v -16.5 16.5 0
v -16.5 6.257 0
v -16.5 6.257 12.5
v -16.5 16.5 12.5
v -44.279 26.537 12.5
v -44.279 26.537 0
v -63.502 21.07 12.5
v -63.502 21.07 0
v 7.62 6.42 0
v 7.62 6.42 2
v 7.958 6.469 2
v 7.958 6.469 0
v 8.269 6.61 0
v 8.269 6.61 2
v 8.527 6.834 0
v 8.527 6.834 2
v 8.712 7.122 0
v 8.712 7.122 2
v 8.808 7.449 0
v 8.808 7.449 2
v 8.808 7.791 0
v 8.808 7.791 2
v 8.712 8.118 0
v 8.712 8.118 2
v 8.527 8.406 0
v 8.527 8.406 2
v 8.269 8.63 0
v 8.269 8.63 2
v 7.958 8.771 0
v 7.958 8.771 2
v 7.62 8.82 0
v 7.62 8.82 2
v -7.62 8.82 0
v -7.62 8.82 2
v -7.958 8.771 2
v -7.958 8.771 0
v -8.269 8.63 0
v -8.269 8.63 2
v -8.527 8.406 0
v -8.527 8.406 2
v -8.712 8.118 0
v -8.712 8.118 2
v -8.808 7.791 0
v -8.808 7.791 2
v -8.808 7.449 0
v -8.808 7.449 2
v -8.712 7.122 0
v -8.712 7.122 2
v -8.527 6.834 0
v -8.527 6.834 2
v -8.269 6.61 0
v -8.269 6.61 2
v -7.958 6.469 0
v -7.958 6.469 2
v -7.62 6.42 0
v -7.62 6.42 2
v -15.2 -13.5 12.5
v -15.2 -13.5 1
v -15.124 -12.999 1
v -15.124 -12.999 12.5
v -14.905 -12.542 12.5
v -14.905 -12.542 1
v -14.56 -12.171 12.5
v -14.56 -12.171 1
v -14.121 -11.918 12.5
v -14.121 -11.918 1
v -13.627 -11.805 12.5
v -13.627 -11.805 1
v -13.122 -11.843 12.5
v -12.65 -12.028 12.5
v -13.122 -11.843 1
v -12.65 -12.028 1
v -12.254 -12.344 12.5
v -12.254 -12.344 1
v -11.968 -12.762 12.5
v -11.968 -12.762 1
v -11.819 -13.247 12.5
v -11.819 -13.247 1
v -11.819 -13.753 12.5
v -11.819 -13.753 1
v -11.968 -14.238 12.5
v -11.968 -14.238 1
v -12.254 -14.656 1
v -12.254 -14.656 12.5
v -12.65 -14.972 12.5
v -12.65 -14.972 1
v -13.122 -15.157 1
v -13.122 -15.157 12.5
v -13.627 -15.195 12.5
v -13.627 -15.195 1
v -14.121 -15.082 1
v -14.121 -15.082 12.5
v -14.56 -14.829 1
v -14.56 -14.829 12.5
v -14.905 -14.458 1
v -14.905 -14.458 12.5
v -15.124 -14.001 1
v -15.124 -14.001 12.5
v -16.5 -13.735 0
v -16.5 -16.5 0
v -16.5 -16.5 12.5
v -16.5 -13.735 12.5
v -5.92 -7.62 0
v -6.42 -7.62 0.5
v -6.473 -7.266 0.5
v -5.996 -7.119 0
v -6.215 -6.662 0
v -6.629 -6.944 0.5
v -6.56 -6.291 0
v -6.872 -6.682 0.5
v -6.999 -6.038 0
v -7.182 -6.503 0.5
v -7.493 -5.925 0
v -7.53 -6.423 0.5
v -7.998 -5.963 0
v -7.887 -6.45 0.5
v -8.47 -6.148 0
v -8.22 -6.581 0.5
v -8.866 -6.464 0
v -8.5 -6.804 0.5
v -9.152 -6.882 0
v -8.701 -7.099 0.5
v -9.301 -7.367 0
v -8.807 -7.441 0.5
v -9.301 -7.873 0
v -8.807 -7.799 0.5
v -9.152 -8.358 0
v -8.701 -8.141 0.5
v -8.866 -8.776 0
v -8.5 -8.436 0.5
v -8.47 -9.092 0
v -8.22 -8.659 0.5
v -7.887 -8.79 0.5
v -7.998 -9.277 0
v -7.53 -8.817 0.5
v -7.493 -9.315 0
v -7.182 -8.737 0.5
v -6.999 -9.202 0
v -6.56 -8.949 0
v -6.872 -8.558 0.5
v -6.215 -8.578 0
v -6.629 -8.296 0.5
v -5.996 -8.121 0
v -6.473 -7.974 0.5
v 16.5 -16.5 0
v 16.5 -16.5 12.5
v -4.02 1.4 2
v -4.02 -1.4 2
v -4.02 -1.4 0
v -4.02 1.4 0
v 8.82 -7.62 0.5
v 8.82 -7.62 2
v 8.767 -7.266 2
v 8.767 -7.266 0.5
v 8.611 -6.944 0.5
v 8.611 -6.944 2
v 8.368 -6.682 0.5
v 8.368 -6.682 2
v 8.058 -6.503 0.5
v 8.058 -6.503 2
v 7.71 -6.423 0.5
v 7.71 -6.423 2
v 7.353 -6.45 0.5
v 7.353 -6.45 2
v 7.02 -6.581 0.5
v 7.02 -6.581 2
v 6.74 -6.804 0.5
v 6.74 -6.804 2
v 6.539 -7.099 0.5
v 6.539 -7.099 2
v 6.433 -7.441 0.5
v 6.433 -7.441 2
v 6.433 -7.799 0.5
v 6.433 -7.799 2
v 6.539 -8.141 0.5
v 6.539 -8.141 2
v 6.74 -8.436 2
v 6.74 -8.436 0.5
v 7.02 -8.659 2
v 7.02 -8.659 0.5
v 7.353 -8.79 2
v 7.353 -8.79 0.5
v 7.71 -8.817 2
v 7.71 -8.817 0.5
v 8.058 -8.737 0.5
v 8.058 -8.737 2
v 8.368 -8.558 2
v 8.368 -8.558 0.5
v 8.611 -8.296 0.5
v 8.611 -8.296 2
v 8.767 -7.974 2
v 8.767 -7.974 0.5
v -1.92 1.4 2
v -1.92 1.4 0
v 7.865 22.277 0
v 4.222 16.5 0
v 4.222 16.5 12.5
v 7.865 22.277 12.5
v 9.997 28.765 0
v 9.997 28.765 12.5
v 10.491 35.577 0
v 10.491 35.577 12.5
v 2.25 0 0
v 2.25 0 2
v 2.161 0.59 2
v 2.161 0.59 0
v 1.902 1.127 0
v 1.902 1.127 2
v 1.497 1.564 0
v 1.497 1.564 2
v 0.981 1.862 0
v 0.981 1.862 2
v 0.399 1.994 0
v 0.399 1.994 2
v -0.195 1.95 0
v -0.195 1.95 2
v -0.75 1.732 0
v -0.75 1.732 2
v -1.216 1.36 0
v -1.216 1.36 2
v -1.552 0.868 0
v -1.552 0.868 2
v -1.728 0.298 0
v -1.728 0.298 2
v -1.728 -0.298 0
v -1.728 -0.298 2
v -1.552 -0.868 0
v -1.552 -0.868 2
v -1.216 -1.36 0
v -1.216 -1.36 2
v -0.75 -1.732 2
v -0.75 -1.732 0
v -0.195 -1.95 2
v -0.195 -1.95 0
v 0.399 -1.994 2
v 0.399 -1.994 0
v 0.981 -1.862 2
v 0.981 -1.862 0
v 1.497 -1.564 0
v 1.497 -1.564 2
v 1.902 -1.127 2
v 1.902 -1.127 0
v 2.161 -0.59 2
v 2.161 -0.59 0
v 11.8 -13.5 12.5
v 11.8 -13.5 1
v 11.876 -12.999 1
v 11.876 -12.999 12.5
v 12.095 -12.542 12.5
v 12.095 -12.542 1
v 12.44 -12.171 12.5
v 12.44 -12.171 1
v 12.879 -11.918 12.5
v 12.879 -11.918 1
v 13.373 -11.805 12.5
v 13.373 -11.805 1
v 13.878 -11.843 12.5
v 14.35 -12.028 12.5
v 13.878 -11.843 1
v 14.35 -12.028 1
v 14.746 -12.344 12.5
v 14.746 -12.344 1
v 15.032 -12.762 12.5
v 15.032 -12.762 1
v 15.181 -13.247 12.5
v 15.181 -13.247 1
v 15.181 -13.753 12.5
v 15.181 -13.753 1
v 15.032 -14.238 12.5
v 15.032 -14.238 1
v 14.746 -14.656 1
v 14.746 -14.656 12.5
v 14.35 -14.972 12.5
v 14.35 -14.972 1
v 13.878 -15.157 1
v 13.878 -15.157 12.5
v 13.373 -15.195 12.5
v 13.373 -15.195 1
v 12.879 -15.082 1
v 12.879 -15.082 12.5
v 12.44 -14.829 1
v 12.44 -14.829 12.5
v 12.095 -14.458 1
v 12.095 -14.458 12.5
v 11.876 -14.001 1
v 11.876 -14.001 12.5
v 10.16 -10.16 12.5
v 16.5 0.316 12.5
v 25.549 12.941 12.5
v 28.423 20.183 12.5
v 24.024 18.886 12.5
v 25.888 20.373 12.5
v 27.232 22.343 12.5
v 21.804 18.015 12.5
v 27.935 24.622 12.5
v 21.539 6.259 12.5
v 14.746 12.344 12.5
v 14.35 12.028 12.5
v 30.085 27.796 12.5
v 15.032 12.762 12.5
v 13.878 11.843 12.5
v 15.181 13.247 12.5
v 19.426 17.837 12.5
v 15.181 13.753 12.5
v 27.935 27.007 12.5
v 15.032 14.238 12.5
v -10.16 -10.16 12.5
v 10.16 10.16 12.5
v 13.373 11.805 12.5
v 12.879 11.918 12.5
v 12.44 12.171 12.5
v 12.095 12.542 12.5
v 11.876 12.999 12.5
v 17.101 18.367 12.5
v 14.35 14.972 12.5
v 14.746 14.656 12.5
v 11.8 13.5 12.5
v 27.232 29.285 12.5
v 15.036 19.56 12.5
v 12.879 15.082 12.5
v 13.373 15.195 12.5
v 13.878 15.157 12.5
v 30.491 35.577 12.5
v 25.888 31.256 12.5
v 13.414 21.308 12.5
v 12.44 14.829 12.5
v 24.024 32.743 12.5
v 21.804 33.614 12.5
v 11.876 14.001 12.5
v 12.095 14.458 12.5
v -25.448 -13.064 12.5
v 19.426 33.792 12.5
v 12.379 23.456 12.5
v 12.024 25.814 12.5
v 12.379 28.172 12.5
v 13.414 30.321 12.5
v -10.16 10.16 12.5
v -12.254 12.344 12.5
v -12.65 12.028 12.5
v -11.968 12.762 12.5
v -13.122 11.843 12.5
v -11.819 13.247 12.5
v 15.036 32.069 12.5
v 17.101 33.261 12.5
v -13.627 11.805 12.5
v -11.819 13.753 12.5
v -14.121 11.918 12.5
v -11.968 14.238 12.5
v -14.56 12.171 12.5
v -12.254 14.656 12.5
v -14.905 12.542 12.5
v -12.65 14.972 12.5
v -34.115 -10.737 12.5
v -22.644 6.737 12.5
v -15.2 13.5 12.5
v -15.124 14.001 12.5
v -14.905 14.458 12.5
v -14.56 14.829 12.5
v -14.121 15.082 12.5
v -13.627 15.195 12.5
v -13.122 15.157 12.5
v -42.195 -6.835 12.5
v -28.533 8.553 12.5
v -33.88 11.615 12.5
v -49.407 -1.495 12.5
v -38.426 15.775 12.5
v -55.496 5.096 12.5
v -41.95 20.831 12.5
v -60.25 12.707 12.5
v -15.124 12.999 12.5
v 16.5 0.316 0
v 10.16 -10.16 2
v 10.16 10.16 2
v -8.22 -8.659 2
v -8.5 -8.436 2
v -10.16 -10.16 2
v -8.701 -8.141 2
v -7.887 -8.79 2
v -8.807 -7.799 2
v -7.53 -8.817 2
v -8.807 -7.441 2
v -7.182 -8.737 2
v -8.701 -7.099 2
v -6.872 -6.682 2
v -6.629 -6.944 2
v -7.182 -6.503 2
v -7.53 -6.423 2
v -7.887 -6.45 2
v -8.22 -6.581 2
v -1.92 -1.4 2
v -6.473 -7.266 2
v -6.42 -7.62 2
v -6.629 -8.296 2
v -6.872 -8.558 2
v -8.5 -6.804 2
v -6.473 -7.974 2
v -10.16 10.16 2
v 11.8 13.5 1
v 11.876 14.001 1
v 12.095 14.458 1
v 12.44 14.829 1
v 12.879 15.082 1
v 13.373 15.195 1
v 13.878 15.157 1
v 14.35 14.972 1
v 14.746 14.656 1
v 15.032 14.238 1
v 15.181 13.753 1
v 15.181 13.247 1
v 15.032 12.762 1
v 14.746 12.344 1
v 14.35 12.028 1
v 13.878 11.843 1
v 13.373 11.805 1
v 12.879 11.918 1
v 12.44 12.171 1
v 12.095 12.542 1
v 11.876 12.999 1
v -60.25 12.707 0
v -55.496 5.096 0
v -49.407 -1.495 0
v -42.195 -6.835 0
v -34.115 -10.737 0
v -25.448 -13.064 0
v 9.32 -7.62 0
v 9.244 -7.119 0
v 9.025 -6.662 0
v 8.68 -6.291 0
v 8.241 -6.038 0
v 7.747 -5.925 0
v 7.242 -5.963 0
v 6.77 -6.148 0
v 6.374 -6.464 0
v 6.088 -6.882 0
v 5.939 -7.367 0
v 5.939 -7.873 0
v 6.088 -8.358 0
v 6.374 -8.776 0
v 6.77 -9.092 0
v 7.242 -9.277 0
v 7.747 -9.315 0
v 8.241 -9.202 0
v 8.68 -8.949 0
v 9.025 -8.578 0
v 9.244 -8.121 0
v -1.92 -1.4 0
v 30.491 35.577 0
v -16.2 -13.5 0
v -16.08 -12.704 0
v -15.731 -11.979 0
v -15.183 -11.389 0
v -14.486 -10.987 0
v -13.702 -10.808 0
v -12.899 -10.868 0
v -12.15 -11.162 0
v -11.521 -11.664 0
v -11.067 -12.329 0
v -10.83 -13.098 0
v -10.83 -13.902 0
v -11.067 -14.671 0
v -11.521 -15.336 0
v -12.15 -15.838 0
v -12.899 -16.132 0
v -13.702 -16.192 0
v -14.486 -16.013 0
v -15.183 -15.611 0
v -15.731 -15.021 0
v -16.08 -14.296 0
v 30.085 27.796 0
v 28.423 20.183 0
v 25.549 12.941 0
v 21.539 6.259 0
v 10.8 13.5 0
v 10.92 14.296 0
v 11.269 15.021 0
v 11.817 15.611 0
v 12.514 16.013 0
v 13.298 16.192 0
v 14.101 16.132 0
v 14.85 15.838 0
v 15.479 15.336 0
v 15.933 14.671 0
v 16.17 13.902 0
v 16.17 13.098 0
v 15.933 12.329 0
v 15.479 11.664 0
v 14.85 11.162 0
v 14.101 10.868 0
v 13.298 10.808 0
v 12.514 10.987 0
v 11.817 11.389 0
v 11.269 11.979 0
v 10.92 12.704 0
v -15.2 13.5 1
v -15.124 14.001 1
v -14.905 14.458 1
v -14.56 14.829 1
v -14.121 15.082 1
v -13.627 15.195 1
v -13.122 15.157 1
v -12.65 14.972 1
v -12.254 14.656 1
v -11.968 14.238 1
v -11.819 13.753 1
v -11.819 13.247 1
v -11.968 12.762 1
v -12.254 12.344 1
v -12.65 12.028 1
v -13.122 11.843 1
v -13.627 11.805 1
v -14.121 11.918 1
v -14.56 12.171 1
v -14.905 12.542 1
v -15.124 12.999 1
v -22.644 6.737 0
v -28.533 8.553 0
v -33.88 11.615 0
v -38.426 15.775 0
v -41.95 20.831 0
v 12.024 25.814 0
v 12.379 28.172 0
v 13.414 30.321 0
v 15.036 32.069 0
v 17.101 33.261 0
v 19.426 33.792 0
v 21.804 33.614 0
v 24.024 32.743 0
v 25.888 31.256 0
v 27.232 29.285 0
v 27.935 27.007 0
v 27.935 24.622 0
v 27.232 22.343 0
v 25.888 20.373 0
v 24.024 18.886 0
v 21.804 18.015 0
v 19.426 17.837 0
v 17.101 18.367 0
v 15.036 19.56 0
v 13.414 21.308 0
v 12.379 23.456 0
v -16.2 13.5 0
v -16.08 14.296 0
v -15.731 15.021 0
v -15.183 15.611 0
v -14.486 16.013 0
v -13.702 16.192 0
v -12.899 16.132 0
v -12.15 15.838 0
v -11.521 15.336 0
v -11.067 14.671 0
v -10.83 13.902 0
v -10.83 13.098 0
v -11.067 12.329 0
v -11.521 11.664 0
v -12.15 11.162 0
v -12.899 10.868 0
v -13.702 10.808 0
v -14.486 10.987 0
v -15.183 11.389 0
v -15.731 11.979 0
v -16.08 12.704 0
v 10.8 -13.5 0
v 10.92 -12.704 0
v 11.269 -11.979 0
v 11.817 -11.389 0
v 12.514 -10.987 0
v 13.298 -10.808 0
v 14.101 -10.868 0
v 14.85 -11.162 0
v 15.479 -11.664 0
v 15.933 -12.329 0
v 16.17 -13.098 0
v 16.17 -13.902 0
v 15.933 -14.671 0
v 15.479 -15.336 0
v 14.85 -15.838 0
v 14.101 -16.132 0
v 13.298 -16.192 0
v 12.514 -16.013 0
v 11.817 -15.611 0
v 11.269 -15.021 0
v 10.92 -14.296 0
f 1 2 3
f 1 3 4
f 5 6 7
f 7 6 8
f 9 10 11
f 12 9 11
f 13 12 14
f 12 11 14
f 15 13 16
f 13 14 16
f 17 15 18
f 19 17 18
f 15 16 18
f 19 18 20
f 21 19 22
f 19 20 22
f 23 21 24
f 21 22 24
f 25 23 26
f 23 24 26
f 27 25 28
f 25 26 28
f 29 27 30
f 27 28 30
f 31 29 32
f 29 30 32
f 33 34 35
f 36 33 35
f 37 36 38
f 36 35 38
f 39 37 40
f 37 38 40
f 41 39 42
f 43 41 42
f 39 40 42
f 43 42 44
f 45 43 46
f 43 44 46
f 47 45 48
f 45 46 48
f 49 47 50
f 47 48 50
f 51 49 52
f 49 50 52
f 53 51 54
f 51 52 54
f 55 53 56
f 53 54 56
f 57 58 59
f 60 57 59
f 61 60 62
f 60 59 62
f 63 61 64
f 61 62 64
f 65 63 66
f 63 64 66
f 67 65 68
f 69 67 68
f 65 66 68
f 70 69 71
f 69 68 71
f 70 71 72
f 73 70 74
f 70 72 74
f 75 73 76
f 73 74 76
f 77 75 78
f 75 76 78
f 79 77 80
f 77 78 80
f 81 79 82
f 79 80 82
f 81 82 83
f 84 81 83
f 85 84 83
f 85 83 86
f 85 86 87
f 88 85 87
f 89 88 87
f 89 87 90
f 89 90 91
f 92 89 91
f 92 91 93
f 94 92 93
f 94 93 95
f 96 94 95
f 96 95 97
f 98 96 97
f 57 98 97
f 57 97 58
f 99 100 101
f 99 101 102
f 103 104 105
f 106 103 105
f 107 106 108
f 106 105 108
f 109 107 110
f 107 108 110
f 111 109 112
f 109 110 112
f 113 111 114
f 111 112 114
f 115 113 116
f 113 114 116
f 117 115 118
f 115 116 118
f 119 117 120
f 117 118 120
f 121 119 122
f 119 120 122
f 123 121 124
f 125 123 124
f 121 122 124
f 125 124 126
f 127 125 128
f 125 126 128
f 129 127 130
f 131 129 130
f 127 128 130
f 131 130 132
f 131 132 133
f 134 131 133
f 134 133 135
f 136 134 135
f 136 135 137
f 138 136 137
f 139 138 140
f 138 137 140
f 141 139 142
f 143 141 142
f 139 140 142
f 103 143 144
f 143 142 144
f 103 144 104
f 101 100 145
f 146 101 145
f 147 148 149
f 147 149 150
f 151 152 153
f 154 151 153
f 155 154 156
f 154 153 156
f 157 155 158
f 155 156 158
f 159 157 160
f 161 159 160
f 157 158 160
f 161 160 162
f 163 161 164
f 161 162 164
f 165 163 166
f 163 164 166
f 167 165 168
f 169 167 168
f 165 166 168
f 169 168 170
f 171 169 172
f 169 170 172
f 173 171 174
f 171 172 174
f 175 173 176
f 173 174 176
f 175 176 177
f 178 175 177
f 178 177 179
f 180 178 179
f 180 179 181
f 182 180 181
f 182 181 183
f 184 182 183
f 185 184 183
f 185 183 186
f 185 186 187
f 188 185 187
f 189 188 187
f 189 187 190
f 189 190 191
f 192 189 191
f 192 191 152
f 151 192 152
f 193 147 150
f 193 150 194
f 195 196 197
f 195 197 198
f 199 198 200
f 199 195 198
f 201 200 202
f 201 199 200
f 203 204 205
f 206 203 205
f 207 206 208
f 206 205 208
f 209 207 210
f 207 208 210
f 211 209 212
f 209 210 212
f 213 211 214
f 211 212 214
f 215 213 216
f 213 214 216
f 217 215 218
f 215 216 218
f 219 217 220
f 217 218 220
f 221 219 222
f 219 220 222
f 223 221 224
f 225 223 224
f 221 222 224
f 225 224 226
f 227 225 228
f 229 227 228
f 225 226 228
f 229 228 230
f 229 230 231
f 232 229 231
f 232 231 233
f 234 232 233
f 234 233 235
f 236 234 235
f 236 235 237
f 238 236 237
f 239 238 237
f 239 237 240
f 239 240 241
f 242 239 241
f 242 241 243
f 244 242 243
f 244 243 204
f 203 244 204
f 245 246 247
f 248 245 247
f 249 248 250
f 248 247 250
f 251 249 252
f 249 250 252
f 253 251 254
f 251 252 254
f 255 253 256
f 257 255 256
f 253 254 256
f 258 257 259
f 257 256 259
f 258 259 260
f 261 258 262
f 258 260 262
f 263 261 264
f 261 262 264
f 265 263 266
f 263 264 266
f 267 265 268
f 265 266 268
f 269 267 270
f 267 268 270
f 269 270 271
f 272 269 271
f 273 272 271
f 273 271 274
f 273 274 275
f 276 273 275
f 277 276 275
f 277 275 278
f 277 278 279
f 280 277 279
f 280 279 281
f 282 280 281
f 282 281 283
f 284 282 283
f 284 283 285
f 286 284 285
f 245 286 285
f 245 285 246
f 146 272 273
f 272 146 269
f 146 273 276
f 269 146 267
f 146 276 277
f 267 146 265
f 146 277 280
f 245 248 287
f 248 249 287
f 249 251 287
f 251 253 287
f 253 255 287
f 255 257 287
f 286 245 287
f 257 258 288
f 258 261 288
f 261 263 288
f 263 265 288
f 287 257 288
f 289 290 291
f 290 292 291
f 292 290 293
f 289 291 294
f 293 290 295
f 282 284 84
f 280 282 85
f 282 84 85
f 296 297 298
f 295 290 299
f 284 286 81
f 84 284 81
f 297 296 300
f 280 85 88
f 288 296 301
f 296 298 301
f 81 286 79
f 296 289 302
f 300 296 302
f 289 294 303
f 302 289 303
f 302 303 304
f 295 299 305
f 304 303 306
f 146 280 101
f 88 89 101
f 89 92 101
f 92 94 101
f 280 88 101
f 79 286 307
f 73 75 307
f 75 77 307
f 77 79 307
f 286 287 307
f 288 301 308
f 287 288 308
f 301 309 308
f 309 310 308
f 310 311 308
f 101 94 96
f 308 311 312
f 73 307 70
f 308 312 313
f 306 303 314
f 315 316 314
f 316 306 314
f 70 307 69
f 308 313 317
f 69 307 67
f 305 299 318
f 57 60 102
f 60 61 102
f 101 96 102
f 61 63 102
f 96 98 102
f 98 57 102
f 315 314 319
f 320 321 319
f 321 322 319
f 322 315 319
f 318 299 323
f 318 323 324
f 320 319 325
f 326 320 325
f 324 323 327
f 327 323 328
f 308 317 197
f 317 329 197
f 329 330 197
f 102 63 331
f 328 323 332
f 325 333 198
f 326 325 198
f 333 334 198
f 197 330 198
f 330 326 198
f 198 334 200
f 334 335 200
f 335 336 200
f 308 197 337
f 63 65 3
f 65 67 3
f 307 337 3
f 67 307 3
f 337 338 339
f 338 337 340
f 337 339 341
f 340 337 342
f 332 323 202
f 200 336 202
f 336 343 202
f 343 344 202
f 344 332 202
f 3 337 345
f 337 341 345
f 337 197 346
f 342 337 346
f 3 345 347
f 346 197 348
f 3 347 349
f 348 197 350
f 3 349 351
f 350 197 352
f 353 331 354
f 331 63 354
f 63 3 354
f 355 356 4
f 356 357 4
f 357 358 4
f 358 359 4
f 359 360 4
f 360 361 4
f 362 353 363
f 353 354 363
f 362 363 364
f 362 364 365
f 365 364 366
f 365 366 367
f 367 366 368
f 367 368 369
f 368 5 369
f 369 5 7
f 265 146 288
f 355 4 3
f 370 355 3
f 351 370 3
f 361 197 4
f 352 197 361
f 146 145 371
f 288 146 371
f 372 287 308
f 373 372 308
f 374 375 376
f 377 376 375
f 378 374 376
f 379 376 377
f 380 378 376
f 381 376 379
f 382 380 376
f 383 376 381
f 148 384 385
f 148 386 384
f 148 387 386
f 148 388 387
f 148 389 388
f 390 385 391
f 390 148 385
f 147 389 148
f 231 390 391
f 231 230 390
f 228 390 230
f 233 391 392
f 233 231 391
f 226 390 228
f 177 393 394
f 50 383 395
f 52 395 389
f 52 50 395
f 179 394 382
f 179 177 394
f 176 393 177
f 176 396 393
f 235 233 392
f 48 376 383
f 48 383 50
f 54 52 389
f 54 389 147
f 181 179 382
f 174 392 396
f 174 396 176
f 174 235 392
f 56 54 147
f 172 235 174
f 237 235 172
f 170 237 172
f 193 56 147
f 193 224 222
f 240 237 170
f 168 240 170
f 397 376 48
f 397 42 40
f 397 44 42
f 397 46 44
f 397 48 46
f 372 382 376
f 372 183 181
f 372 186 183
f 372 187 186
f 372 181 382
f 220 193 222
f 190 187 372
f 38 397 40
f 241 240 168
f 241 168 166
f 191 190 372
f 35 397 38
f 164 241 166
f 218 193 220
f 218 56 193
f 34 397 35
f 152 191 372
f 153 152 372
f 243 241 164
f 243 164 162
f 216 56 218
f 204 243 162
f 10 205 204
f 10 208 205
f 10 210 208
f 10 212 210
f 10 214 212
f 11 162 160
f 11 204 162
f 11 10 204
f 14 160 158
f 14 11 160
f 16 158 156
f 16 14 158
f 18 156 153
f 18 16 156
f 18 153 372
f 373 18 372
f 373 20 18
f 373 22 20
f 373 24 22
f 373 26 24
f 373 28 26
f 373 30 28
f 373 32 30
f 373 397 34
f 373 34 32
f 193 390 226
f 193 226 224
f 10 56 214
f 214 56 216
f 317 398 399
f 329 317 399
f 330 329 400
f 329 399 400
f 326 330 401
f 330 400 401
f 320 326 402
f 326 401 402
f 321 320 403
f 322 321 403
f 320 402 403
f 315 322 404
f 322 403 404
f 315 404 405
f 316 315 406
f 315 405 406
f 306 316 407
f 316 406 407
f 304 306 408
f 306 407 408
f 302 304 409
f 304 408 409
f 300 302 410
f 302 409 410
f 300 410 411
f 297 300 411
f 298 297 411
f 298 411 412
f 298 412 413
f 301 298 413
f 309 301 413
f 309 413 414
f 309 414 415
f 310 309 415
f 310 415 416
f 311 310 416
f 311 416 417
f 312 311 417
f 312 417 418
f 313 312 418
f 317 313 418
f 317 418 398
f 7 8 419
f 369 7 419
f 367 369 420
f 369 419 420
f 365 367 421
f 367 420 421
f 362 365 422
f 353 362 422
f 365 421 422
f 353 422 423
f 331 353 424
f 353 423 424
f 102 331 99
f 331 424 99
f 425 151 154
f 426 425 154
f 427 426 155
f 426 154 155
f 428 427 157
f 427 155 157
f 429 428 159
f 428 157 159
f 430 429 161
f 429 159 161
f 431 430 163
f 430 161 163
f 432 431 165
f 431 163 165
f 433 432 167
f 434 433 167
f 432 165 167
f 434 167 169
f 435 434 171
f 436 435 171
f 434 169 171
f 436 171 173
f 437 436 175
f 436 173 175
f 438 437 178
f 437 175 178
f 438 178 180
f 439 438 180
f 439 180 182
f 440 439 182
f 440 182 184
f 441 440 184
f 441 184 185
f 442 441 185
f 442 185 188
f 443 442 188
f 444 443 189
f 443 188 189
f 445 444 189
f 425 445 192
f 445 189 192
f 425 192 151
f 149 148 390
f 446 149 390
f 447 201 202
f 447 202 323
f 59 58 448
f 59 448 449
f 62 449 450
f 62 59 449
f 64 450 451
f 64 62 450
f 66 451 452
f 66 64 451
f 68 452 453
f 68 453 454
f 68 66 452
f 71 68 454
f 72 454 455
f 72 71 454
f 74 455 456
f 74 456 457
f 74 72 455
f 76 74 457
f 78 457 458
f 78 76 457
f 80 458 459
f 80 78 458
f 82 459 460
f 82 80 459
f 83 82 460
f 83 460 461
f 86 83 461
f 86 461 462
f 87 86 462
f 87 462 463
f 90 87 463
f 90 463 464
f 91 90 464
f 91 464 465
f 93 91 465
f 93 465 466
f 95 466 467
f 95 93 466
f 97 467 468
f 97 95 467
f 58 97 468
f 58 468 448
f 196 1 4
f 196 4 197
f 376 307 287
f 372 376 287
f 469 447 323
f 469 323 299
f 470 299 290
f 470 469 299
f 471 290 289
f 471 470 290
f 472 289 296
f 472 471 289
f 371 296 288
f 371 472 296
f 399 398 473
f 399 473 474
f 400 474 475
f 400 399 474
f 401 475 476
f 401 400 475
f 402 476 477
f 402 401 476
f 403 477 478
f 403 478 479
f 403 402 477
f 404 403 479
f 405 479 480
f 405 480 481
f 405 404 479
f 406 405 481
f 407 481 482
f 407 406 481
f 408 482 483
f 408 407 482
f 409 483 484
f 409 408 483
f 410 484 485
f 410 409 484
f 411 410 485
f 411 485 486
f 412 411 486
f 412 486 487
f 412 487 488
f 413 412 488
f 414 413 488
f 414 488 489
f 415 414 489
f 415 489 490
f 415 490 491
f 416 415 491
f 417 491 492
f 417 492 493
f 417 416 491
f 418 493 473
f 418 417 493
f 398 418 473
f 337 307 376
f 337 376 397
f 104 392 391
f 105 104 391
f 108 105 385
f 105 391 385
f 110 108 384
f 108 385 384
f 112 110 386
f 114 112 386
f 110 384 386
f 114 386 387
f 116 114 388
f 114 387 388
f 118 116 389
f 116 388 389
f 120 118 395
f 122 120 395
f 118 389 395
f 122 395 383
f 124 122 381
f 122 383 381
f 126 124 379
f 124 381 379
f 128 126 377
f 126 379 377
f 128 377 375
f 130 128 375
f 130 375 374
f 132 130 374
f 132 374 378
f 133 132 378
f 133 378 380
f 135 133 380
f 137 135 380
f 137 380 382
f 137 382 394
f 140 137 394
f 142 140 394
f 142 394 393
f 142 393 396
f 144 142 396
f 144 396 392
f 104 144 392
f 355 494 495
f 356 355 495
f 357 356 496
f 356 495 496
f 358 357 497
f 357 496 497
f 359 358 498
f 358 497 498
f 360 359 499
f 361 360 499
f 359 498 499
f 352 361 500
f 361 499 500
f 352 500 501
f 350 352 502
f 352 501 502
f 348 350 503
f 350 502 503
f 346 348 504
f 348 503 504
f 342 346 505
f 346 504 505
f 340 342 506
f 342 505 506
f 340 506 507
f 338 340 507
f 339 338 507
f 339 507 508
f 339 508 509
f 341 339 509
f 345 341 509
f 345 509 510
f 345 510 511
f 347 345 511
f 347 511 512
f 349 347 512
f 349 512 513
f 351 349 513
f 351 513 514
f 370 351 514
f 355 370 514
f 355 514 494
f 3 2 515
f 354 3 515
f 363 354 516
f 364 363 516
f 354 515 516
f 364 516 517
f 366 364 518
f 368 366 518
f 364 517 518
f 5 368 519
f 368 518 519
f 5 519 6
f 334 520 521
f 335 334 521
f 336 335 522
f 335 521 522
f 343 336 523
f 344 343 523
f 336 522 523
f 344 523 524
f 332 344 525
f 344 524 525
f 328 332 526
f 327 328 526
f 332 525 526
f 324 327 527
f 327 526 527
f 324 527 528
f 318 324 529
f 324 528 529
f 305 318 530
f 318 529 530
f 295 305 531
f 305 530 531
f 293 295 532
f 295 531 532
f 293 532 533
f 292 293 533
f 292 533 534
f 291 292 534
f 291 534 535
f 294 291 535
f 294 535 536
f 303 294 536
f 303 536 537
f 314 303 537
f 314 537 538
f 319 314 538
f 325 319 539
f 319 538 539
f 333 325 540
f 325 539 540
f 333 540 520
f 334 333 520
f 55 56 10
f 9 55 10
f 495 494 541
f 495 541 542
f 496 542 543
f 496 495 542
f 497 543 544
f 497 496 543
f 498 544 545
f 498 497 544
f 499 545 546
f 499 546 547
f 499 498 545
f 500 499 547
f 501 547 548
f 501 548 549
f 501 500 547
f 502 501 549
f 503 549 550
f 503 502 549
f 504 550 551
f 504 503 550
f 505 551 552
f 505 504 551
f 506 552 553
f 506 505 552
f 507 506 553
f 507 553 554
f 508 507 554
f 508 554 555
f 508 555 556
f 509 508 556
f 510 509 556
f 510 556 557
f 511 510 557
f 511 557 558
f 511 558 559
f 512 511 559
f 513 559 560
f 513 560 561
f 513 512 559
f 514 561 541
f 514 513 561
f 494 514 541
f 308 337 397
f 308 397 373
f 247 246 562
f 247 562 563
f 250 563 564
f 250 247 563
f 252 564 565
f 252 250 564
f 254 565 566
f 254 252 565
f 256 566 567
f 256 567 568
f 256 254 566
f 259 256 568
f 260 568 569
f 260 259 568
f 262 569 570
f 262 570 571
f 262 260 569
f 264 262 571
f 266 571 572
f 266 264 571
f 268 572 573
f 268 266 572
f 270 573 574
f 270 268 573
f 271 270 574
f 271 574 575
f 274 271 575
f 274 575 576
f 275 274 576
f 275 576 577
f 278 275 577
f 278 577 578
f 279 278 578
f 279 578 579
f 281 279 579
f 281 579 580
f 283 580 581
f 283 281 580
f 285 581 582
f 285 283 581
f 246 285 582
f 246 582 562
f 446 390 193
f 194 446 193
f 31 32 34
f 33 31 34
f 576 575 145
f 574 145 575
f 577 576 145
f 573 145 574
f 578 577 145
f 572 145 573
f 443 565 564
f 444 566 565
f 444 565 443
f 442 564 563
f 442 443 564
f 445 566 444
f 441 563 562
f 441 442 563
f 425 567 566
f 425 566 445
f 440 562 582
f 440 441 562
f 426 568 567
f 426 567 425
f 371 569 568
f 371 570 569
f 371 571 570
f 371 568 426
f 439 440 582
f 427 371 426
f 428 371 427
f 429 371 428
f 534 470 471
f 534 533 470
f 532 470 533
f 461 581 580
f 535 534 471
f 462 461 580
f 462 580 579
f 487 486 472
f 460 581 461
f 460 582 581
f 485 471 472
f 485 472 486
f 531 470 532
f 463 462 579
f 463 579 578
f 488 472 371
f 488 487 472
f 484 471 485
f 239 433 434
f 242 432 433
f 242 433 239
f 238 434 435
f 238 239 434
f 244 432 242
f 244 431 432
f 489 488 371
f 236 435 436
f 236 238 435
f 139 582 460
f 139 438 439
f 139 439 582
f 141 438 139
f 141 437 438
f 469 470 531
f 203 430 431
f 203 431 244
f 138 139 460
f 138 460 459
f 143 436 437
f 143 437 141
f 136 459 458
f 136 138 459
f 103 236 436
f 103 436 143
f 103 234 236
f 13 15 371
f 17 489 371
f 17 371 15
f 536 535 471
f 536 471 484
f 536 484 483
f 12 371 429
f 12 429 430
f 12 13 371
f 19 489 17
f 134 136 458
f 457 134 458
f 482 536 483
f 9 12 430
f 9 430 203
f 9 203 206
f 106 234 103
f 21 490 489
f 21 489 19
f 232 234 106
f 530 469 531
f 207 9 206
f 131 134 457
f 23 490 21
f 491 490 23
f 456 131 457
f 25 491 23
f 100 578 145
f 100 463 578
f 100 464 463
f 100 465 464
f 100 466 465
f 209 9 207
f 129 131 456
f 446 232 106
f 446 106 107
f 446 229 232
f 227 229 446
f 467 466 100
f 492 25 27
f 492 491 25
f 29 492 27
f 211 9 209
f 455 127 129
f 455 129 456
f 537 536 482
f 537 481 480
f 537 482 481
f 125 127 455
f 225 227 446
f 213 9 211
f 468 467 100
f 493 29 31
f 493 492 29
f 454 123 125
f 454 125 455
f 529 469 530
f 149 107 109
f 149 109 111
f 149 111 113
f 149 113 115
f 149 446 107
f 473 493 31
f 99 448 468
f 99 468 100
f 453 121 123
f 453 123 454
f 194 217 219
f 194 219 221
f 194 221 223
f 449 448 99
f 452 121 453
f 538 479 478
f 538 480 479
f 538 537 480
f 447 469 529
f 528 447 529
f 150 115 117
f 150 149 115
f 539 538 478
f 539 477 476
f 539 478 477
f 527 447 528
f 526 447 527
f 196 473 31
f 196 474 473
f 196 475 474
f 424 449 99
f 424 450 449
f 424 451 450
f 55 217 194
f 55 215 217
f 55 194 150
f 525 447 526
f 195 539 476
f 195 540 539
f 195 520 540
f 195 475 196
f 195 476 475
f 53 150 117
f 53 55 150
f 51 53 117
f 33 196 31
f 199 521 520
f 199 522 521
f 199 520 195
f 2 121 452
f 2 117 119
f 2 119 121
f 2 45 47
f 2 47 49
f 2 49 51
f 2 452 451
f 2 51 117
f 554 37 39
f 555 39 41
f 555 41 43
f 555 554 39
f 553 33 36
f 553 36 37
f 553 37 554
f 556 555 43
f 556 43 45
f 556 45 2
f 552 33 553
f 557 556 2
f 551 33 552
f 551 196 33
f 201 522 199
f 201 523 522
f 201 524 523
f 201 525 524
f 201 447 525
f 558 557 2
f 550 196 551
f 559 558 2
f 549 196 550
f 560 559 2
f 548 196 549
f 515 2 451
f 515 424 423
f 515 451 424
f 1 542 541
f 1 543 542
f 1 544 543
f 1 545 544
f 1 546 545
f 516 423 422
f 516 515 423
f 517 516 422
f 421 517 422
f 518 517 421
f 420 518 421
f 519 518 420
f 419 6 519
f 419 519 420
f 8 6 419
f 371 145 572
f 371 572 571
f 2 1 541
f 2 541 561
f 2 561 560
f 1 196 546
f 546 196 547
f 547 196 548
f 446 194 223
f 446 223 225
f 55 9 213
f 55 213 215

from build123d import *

# Parameters (mm, degrees)
ESQUISSE1_W             = 33
ESQUISSE1_H             = 33
BOSS_EXTRU_1_DEPTH      = 12.5
ESQUISSE3_R             = 2
ESQUISSE3_W             = 2.1
ESQUISSE3_H             = 2.8
ENL_V_MAT_EXTRU_1_DEPTH = 13.5
ESQUISSE2_R             = 1.2
ENL_V_MAT_EXTRU_3_DEPTH = 13.5
ESQUISSE5_W             = 20.32
ESQUISSE5_H             = 20.32
ENL_V_MAT_EXTRU_5_DEPTH = 10.5
ESQUISSE8_R             = 8
BOSS_EXTRU_4_DEPTH      = 12.5
D_GAGEMENT_M31_D        = 3.4
CHANFREIN1_SIZE         = 1
CHANFREIN2_SIZE         = 0.5


with BuildPart() as part:
    # Esquisse1 → Boss.-Extru.1 (new body)
    with BuildSketch(Plane.XY):
        Rectangle(ESQUISSE1_W, ESQUISSE1_H)
    extrude(amount=BOSS_EXTRU_1_DEPTH)

    # Esquisse3 → Enlèv. mat.-Extru.1 (cut, through all)
    with BuildSketch(Plane.XY.offset(12.5)):
        with Locations((0.25, 0)):
            Circle(ESQUISSE3_R)
        with Locations((-2.97, 0)):
            Rectangle(ESQUISSE3_W, ESQUISSE3_H)
    extrude(amount=-ENL_V_MAT_EXTRU_1_DEPTH, mode=Mode.SUBTRACT)

    # Esquisse2 → Enlèv. mat.-Extru.3 (cut, through all)
    with BuildSketch(Plane.XY.offset(12.5)):
        with BuildLine():
            Line((7.62, 8.82), (-7.62, 8.82))
            ThreePointArc((-7.62, 8.82), (-8.82, 7.62), (-7.62, 6.42))
            Line((-7.62, 6.42), (7.62, 6.42))
            ThreePointArc((7.62, 6.42), (8.82, 7.62), (7.62, 8.82))
        make_face()
        with Locations((7.62, -7.62)):
            Circle(ESQUISSE2_R)
        with Locations((-7.62, -7.62)):
            Circle(ESQUISSE2_R)
    extrude(amount=-ENL_V_MAT_EXTRU_3_DEPTH, mode=Mode.SUBTRACT)

    # Esquisse5 → Enlèv. mat.-Extru.5 (cut)
    with BuildSketch(Plane.XY.offset(12.5)):
        Rectangle(ESQUISSE5_W, ESQUISSE5_H)
    extrude(amount=-ENL_V_MAT_EXTRU_5_DEPTH, mode=Mode.SUBTRACT)

    # Esquisse8 → Boss.-Extru.4 (add)
    with BuildSketch(Plane(origin=(0, 0, 0), x_dir=(-1, 0, 0), z_dir=(0, 0, -1))):
        with BuildLine():
            Line((-10.491194523, 35.577324893), (-30.491194523, 35.577324893))
            ThreePointArc((-30.491194523, 35.577324893), (-27.133349226, 16.503433006), (-16.5, 0.31639001))
            Line((-16.5, 0.31639001), (-16.5, 16.5))
            Line((-16.5, 16.5), (-4.221778996, 16.5))
            ThreePointArc((-4.221778996, 16.5), (-9.129954495, 25.455844561), (-10.491194523, 35.577324893))
        make_face()
        with Locations((-20.024037982, 25.814414184)):
            Circle(ESQUISSE8_R, mode=Mode.SUBTRACT)
        with BuildLine():
            Line((44.278689278, 26.536687189), (63.501960696, 21.070416717))
            ThreePointArc((63.501960696, 21.070416717), (45.926381173, -4.33394458), (16.5, -13.734511563))
            Line((16.5, -13.734511563), (16.5, 6.257008408))
            ThreePointArc((16.5, 6.257008408), (33.880318455, 11.614983254), (44.278689278, 26.536687189))
        make_face()
    extrude(amount=-BOSS_EXTRU_4_DEPTH)

    # Dégagement M31 (through all)
    with Locations(Plane(origin=(-13.5, 13.5, 12.5), x_dir=(1, 0, 0), z_dir=(0, 0, 1))):
        with Locations((0, 0), (27, 0), (27, -27), (0, -27)):
            Hole(D_GAGEMENT_M31_D / 2)

    # Chanfrein1
    chanfrein1_edges = [part.edges().sort_by_distance(p)[0] for p in [
        (-11.8, -13.5, 0),
        (15.2, -13.5, 0),
        (15.2, 13.5, 0),
        (-11.8, 13.5, 0),
    ]]
    chamfer(chanfrein1_edges, length=CHANFREIN1_SIZE)

    # Chanfrein2
    chanfrein2_edges = [part.edges().sort_by_distance(p)[0] for p in [
        (6.42, -7.62, 0),
        (-8.82, -7.62, 0),
    ]]
    chamfer(chanfrein2_edges, length=CHANFREIN2_SIZE)


solid = part.part
